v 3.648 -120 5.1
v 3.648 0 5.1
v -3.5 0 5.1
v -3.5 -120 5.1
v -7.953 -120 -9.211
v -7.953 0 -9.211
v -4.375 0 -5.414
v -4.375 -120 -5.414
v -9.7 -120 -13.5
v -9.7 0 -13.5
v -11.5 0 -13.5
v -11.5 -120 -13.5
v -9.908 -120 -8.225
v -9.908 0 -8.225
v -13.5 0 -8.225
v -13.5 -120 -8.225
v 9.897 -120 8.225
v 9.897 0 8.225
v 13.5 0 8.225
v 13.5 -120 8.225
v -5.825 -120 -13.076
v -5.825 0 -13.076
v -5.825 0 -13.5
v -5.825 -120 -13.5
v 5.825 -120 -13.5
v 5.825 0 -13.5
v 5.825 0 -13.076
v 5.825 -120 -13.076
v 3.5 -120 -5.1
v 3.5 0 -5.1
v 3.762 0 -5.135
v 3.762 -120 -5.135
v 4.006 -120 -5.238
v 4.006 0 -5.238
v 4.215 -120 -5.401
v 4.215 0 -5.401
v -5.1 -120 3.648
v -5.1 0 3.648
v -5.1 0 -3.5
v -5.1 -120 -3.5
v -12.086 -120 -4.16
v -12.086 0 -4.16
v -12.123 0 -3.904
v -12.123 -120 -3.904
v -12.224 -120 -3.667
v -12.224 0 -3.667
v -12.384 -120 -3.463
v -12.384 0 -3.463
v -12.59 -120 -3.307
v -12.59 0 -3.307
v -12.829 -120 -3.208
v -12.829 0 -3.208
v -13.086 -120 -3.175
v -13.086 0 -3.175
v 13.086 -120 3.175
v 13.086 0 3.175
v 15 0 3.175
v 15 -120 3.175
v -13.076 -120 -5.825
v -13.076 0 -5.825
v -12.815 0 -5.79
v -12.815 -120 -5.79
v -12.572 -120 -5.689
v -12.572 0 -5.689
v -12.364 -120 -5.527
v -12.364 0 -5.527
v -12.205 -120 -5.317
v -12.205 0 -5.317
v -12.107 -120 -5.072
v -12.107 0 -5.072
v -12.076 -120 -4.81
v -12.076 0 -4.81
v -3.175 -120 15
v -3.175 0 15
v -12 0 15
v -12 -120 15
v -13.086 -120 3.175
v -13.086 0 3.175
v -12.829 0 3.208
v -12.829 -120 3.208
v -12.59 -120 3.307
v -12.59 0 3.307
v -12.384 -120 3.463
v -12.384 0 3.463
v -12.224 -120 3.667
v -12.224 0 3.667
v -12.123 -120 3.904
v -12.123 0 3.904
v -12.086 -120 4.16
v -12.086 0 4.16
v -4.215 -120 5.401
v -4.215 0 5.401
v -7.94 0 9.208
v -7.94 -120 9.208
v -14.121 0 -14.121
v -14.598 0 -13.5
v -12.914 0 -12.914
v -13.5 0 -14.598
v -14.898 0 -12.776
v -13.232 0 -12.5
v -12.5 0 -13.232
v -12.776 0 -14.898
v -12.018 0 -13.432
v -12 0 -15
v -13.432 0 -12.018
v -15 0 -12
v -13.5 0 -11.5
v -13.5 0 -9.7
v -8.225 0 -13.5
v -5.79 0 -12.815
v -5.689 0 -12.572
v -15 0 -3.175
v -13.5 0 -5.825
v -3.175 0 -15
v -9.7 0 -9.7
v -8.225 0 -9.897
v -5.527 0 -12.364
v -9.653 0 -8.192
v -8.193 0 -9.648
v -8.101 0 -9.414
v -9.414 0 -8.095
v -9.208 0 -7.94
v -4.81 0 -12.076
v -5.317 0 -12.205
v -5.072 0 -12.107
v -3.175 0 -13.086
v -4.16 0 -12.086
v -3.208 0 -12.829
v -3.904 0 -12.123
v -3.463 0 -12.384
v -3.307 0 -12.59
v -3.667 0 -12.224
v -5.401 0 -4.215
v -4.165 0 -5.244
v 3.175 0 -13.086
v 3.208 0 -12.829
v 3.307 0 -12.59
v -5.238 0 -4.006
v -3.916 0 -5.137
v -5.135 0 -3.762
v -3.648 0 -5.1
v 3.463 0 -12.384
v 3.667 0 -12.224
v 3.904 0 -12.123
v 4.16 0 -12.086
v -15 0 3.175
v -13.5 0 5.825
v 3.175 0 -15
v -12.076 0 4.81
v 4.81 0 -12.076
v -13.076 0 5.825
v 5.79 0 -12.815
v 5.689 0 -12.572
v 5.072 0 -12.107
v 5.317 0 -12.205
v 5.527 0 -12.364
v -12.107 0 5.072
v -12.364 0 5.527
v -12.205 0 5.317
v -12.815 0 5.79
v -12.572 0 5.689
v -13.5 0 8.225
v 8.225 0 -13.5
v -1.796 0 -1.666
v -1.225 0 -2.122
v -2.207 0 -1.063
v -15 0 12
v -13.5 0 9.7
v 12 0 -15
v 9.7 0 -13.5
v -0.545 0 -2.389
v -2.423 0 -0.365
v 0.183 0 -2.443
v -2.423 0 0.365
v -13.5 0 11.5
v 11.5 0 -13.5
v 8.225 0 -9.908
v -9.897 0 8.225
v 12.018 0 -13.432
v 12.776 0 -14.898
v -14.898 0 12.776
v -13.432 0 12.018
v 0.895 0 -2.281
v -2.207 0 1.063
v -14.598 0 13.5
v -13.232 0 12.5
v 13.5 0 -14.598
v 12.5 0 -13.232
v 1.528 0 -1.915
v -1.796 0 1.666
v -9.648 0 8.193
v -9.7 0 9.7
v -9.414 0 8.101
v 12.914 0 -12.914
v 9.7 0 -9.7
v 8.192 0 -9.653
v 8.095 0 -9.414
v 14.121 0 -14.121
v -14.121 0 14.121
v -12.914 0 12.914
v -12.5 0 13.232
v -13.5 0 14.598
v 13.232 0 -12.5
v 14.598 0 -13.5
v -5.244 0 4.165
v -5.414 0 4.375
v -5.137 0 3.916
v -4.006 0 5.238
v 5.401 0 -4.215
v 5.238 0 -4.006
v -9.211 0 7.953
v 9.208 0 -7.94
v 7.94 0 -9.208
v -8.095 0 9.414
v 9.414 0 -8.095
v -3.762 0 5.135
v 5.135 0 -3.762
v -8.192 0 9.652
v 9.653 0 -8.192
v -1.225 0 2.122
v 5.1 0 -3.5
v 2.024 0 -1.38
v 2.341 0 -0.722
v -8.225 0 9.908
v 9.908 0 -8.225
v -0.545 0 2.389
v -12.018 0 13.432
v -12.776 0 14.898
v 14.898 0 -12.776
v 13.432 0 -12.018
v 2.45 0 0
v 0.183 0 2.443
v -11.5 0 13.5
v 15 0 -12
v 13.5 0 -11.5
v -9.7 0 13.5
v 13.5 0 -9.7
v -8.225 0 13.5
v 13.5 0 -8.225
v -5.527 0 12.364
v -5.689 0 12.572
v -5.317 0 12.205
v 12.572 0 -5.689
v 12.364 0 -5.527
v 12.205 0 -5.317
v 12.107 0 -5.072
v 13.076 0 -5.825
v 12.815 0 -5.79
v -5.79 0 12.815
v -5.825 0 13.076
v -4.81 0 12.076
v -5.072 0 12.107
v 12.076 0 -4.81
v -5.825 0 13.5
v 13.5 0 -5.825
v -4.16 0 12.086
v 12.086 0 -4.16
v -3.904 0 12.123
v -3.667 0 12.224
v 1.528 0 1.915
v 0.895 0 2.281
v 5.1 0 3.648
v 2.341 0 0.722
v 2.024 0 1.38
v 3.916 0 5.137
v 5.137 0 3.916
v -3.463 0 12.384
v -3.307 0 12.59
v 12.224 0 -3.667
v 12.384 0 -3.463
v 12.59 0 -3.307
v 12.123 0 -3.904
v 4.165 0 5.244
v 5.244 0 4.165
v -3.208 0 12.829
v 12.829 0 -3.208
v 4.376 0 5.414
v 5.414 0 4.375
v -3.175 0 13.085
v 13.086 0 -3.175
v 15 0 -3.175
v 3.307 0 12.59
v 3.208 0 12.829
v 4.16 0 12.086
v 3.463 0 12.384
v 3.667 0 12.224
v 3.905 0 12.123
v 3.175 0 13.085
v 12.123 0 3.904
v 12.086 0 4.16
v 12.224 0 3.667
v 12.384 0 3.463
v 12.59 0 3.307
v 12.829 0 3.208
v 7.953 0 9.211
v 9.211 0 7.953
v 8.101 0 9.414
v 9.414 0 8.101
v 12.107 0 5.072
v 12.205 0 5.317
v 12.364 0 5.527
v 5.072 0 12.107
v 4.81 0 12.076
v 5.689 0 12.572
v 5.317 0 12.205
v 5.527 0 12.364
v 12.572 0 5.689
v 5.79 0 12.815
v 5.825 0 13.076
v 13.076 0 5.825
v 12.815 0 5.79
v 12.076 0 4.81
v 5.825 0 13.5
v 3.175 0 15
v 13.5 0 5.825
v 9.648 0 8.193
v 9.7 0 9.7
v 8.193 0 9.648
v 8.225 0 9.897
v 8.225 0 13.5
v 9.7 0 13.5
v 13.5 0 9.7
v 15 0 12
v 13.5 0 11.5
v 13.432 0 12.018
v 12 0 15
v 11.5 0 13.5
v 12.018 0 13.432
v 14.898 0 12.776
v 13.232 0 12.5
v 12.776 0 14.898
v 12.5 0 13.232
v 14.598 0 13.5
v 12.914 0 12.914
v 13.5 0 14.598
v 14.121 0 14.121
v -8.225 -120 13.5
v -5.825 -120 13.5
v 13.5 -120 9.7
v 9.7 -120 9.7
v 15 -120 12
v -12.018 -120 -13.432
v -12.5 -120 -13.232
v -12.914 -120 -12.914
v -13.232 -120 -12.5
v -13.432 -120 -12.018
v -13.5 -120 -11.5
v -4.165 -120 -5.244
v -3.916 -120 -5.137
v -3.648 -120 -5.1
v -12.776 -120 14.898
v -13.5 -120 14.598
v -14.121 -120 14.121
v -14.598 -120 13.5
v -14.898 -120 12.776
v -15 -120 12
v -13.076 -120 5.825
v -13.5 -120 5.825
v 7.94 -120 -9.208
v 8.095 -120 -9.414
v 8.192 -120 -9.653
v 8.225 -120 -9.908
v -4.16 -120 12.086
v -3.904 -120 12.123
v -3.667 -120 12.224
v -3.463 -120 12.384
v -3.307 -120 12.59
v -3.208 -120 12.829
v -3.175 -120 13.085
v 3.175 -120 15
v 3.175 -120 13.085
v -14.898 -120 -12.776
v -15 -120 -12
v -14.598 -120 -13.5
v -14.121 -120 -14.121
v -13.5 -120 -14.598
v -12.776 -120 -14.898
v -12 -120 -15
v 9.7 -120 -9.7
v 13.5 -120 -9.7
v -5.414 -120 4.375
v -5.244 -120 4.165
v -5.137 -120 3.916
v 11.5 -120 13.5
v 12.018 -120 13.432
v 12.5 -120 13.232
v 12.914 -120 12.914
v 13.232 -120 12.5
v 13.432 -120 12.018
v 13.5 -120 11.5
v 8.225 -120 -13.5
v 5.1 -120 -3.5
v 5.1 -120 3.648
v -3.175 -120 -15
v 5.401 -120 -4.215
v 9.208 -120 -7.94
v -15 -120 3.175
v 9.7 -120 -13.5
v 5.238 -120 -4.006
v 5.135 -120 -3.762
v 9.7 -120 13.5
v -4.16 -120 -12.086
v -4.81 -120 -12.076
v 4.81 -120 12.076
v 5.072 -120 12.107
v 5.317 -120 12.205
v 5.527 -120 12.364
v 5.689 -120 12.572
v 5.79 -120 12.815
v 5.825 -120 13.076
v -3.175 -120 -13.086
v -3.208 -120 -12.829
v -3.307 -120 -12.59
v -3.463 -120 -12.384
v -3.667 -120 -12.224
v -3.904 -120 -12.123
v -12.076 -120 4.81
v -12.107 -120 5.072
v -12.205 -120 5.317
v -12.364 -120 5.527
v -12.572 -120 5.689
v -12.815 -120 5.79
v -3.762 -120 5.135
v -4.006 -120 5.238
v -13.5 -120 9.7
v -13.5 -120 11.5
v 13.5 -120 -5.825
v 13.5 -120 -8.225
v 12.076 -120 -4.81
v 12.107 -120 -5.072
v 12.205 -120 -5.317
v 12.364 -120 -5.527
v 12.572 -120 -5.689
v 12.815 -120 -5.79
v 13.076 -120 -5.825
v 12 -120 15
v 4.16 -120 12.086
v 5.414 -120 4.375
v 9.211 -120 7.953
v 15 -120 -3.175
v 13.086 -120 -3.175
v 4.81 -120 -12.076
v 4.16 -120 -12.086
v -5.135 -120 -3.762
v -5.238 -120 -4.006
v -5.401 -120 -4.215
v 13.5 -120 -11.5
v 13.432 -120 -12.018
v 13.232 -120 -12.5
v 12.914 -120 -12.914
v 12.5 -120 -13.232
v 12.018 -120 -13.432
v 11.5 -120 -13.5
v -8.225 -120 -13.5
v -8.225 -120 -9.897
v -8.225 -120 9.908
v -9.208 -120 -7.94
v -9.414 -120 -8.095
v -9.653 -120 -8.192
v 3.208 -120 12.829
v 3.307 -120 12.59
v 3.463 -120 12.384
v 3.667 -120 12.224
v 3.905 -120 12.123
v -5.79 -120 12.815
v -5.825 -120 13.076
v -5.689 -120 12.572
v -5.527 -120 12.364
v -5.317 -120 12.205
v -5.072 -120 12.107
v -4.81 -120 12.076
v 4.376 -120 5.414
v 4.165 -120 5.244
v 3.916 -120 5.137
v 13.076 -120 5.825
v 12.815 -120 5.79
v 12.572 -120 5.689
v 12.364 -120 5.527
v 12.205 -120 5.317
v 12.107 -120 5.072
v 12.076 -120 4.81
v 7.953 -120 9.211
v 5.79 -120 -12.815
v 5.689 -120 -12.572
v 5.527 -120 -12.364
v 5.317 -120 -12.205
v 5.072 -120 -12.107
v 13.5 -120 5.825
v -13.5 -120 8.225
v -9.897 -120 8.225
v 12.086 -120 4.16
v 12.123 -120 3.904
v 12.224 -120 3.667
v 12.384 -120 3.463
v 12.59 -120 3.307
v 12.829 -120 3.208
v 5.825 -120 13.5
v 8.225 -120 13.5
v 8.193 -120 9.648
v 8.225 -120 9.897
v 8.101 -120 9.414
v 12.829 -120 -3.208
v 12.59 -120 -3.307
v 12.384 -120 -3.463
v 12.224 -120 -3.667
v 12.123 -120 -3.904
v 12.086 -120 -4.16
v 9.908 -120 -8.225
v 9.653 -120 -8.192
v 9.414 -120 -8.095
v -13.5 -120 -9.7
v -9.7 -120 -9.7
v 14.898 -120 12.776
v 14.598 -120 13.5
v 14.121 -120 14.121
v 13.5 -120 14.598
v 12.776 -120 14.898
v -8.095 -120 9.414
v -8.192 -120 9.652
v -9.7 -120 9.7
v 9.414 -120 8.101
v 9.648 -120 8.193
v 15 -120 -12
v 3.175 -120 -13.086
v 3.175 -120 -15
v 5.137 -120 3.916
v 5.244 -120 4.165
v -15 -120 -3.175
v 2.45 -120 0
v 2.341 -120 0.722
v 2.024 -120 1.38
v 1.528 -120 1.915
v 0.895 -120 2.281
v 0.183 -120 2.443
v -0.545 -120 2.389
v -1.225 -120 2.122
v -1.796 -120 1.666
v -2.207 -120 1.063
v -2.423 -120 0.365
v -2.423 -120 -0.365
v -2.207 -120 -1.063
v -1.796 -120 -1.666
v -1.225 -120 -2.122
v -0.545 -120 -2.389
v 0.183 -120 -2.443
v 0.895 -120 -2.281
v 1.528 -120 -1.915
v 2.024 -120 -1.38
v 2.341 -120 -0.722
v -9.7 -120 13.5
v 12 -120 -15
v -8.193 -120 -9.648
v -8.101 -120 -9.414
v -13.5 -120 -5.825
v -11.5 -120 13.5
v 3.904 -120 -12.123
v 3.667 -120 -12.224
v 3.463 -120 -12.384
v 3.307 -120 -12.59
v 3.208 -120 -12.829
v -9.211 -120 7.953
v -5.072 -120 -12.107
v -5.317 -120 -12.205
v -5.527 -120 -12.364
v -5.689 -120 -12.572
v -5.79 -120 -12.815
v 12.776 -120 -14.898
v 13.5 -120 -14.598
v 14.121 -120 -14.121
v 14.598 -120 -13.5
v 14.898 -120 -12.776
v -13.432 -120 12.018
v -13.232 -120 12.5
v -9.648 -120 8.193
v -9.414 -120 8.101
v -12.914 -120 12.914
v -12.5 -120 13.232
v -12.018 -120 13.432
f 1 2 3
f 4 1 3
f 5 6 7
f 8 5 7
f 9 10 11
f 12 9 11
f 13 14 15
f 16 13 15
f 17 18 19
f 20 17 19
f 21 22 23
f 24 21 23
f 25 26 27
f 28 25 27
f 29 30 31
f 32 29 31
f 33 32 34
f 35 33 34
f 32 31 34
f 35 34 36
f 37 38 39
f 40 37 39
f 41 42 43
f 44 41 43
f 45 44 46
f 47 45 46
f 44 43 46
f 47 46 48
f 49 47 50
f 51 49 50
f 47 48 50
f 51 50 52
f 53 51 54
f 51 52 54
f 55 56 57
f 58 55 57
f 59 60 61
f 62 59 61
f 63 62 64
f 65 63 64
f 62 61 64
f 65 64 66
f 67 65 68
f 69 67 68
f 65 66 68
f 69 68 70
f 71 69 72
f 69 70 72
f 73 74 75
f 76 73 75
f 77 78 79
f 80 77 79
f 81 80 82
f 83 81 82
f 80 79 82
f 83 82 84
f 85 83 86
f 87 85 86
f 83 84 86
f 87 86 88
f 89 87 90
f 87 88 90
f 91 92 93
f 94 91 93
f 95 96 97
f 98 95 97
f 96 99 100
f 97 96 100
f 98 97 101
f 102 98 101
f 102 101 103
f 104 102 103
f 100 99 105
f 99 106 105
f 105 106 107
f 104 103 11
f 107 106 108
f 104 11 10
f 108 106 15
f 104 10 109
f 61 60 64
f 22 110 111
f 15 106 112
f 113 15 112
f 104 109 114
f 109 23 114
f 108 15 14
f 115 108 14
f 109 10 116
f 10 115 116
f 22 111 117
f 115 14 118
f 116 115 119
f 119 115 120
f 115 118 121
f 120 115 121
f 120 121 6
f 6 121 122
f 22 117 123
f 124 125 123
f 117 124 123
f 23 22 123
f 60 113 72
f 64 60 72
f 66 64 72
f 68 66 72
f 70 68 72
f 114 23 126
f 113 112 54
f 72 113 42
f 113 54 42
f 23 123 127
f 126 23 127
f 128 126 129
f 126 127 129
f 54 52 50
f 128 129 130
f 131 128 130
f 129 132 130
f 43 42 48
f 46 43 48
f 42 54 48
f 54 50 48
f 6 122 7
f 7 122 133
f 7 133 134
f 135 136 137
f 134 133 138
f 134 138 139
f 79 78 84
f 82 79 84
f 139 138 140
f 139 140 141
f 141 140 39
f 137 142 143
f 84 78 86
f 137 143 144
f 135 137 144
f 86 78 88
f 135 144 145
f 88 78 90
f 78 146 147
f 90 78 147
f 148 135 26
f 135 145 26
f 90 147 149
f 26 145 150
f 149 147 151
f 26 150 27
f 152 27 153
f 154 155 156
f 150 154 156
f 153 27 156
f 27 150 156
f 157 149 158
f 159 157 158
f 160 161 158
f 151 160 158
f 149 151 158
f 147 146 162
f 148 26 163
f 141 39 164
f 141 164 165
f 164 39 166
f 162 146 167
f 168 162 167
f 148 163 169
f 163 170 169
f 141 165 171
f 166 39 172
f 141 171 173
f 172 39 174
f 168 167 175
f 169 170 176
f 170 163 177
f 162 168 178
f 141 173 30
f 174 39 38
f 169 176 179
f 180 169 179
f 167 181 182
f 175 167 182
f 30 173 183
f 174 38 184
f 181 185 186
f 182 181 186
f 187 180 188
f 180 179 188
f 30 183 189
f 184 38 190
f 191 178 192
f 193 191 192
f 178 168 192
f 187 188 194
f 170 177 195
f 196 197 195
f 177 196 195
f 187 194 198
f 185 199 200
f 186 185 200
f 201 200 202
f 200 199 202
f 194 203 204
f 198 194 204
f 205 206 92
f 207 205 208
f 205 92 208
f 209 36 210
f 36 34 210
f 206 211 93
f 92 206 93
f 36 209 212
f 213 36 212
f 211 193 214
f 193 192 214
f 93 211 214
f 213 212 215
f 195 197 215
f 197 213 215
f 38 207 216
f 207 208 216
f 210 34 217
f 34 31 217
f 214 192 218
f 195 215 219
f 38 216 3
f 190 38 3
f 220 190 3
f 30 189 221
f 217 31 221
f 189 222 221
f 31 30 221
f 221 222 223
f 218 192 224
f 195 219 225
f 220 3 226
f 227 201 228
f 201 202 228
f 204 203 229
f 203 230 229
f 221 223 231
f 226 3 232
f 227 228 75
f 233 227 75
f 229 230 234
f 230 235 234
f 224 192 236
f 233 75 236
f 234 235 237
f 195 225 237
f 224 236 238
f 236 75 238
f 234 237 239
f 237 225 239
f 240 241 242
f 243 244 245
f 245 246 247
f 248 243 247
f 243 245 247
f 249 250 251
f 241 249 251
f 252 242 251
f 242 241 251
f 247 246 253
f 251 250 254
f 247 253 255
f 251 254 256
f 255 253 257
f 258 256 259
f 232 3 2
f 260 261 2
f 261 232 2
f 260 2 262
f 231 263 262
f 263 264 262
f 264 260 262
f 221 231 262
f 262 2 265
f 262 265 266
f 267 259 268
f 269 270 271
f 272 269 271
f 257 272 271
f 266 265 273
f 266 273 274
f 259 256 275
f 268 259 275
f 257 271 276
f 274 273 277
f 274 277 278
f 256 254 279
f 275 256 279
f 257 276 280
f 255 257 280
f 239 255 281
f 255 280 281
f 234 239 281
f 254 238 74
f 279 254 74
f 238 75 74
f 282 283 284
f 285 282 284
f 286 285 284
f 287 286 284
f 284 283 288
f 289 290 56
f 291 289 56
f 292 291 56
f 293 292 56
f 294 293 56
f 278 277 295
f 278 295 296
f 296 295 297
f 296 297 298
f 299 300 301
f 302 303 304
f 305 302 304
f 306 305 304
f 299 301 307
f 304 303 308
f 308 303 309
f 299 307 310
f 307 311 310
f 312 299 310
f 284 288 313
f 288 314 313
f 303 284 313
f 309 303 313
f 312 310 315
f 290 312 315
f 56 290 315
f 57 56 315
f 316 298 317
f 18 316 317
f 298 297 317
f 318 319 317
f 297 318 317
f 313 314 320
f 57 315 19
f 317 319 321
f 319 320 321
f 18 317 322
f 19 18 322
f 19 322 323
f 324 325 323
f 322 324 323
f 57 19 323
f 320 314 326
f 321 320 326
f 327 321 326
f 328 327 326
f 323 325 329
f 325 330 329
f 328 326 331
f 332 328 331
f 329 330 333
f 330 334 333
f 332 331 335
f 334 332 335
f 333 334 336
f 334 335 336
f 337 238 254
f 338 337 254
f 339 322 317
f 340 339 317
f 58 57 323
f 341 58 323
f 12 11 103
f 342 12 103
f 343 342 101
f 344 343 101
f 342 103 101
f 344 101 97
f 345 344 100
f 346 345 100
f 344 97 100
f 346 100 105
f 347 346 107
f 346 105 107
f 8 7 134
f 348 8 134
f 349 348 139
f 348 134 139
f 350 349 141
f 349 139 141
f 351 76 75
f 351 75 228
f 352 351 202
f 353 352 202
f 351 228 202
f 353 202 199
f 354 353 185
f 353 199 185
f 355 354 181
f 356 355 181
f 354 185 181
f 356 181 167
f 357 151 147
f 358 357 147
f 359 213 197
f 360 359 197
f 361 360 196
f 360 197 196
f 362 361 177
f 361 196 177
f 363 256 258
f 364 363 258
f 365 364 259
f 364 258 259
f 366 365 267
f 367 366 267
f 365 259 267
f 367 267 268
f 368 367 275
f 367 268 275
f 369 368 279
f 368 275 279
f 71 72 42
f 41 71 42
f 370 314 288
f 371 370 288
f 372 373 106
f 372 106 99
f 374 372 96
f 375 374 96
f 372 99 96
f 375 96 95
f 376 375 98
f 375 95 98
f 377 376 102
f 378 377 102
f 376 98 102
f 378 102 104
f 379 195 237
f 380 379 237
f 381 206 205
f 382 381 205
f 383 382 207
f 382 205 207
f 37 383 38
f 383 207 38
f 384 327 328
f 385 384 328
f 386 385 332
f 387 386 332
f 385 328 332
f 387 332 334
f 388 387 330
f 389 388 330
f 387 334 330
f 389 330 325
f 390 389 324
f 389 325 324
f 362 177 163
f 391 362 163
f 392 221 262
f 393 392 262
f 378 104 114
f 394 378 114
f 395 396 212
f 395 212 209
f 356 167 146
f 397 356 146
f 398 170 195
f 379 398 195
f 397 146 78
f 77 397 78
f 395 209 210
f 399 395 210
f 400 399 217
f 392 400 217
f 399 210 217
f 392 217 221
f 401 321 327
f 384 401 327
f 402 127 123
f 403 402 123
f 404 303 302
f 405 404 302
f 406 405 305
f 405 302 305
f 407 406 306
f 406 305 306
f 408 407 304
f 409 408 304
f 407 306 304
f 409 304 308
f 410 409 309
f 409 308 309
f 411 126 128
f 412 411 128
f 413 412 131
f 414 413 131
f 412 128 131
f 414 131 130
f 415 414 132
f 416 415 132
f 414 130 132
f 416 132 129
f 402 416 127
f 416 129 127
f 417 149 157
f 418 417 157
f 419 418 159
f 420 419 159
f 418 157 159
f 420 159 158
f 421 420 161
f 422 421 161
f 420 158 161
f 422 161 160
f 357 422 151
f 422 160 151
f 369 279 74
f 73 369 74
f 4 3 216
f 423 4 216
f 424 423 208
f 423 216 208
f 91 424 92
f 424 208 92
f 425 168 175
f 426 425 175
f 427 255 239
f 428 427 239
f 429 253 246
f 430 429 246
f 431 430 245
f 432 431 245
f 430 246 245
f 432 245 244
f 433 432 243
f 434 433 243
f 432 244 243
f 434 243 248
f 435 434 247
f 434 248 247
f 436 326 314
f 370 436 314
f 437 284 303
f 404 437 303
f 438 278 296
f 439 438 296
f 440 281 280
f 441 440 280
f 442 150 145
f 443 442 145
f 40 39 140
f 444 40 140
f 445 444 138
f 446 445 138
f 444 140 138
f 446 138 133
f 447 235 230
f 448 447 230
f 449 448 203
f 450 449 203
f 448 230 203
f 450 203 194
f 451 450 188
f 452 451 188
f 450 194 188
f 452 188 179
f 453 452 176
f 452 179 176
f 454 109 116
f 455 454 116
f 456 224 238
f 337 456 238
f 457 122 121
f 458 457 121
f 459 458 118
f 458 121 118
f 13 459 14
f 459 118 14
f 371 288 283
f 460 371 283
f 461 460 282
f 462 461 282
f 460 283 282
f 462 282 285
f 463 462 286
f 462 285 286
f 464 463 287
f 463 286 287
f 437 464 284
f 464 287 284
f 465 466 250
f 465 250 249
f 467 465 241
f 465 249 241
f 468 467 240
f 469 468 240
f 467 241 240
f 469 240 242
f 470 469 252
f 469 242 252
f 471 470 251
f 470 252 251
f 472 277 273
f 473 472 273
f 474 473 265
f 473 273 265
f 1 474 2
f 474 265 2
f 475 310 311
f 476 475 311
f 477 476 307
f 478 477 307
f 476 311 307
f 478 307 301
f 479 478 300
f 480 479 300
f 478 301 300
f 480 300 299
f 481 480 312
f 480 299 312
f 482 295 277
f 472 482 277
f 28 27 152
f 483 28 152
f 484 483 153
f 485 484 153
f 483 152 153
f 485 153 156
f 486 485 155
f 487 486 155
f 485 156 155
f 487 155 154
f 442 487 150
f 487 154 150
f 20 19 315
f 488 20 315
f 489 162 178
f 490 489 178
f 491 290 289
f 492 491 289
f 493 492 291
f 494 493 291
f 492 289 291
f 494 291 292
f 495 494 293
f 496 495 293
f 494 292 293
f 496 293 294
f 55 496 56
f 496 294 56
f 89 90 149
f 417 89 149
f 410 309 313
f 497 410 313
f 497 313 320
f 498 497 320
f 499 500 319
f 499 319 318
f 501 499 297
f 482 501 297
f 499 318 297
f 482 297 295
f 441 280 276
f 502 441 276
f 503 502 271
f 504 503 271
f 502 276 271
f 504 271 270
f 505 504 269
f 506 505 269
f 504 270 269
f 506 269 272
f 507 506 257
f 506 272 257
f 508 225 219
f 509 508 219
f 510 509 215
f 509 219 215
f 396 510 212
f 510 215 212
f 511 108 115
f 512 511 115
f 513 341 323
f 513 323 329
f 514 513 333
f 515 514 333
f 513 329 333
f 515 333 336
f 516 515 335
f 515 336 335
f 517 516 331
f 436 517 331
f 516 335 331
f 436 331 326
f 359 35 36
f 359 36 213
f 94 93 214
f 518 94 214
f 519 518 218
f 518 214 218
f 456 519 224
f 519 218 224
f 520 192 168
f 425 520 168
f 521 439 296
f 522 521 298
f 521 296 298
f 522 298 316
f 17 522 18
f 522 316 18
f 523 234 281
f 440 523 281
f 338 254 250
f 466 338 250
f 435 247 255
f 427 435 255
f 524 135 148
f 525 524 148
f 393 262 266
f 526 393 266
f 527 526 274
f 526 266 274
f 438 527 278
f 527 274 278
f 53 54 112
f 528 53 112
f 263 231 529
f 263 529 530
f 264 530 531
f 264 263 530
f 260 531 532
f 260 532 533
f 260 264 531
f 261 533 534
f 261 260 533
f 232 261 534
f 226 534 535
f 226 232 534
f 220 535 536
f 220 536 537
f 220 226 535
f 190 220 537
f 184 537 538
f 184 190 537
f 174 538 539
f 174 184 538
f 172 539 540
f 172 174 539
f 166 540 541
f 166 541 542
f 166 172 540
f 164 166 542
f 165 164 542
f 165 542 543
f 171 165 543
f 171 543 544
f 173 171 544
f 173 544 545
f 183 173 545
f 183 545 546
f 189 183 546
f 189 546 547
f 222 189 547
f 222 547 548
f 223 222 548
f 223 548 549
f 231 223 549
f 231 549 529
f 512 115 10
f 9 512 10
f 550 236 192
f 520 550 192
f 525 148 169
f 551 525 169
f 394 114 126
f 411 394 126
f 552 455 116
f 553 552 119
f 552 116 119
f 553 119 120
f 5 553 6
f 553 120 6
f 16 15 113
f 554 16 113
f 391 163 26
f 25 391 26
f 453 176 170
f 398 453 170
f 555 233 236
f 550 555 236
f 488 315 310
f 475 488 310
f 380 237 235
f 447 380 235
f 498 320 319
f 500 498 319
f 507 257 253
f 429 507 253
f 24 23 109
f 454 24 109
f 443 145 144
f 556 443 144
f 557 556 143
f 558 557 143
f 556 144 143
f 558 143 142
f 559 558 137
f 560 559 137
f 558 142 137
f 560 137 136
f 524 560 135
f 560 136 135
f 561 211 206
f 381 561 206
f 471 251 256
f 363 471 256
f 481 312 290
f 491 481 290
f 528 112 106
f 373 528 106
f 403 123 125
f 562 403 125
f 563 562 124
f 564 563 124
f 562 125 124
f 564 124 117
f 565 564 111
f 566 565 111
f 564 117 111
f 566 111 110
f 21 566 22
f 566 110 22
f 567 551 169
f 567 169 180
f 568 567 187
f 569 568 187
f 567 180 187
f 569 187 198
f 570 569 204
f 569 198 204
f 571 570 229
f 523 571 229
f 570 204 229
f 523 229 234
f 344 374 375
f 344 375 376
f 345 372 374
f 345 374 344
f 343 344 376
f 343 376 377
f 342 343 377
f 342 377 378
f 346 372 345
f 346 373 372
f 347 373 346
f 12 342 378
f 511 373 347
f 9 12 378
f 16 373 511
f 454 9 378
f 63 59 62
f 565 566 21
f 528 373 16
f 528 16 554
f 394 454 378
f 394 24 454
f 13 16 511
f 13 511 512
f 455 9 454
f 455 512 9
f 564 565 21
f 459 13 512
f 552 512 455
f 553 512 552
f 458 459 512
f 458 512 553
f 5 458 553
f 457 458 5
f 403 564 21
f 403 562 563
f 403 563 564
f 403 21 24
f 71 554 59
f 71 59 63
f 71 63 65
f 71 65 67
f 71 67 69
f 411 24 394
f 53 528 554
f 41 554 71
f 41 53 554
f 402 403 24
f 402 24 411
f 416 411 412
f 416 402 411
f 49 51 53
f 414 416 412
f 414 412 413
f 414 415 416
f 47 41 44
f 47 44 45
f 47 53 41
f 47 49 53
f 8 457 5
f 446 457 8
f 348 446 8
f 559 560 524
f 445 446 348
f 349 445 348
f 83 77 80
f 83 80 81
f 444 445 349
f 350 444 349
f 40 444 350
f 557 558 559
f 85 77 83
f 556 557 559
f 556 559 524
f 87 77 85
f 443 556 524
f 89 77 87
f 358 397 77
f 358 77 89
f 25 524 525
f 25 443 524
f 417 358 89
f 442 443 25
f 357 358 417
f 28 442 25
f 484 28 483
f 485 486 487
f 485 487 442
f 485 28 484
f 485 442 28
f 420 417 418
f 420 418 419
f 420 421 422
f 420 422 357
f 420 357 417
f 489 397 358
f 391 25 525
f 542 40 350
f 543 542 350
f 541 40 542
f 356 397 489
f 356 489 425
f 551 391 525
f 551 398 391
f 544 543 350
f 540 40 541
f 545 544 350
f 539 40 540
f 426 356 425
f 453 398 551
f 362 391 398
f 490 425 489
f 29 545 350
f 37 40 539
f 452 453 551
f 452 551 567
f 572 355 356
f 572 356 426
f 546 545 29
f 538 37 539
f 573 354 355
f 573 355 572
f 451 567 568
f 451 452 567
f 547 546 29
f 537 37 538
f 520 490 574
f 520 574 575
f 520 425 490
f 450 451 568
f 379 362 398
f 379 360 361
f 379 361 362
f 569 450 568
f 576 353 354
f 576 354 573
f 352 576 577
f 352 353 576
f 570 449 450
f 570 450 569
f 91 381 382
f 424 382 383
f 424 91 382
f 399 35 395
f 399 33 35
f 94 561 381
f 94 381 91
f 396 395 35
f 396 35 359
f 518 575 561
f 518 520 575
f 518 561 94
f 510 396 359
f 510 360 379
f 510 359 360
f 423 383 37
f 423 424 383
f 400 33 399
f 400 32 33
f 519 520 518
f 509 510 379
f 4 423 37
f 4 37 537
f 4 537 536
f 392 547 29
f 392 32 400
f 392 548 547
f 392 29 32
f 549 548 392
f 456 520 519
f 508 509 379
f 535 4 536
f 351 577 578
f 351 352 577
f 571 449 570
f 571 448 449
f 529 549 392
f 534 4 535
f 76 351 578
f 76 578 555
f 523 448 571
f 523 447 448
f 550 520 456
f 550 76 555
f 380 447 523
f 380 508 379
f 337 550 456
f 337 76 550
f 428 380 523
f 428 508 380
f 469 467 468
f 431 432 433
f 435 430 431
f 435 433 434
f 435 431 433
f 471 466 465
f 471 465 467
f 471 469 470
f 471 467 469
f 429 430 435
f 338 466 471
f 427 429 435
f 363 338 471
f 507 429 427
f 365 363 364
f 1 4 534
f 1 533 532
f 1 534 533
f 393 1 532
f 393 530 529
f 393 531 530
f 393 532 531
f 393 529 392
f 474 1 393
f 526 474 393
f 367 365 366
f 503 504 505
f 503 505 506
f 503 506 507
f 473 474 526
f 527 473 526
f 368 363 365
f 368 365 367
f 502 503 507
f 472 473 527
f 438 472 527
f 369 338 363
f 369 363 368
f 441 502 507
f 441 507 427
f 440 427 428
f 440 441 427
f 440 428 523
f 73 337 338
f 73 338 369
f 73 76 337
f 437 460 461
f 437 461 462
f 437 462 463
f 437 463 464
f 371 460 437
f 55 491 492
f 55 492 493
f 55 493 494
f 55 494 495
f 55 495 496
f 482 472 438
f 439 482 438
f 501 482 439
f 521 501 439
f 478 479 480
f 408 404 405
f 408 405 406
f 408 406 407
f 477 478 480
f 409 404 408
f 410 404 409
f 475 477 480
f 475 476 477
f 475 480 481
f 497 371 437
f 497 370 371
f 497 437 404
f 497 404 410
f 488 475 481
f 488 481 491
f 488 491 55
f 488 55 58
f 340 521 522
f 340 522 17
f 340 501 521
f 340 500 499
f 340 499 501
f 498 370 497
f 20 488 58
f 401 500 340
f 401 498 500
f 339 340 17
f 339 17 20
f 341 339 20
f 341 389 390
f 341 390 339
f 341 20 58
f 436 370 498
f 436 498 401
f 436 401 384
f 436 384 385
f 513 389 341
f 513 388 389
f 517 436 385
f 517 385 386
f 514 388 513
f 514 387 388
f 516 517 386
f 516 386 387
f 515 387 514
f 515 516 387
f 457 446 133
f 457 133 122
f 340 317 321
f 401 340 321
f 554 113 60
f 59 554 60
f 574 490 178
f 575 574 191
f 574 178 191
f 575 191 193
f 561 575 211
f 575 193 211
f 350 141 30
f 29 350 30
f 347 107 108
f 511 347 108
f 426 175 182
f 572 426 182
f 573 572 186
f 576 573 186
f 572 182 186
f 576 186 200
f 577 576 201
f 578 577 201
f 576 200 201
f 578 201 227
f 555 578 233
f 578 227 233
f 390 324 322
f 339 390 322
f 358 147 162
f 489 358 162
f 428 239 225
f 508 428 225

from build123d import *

# Parameters (mm, degrees)
F0_R     = 2.45
F1_DEPTH = 460
F2_DEPTH = 340


# Not quite as in the source:
# - ends of sketch curves that miss each other by under 0.0002 mm in the source are joined


with BuildPart() as f1:
    # F0 (on Front) → F1 (new body)
    with BuildSketch(Plane.XZ):
        with BuildLine():
            Line((-3.1749674082, 15), (-12, 15))
            ThreePointArc((-12, 15), (-14.1213203436, 14.1213203436), (-15, 12))
            Line((-15, 12), (-15, 3.175))
            Line((-15, 3.175), (-13.0855346263, 3.175))
            ThreePointArc((-13.0855346263, 3.175), (-12.3835980145, 3.4627605788), (-12.0856407741, 4.1604300138))
            Line((-12.0856407741, 4.1604300138), (-12.0761692778, 4.8104300138))
            ThreePointArc((-12.0761692778, 4.8104300138), (-12.3638237087, 5.5269366118), (-13.0760631299, 5.825))
            Line((-13.0760631299, 5.825), (-13.5, 5.825))
            Line((-13.5, 5.825), (-13.5, 8.225))
            Line((-13.5, 8.225), (-9.8968845016, 8.225))
            ThreePointArc((-9.8968845016, 8.225), (-9.5279915195, 8.1544718757), (-9.2111331975, 7.9528359354))
            Line((-9.2111331975, 7.9528359354), (-5.4142486959, 4.3754933338))
            ThreePointArc((-5.4142486959, 4.3754933338), (-5.1819174045, 4.0440465354), (-5.1, 3.6476573984))
            Line((-5.1, 3.6476573984), (-5.1, -3.4999243287))
            ThreePointArc((-5.1, -3.4999243287), (-5.1782354607, -3.8876744211), (-5.4007002683, -4.2147528992))
            Line((-5.4007002683, -4.2147528992), (-9.2084959767, -7.9398285705))
            ThreePointArc((-9.2084959767, -7.9398285705), (-9.5301904718, -8.1509666761), (-9.9077957084, -8.225))
            Line((-9.9077957084, -8.225), (-13.5, -8.225))
            Line((-13.5, -8.225), (-13.5, -5.825))
            Line((-13.5, -5.825), (-13.0760631299, -5.825))
            ThreePointArc((-13.0760631299, -5.825), (-12.3638237087, -5.5269366118), (-12.0761692778, -4.8104300138))
            Line((-12.0761692778, -4.8104300138), (-12.0856407741, -4.1604300138))
            ThreePointArc((-12.0856407741, -4.1604300138), (-12.3835980145, -3.4627605788), (-13.0855346263, -3.175))
            Line((-13.0855346263, -3.175), (-15, -3.175))
            Line((-15, -3.175), (-15, -12))
            ThreePointArc((-15, -12), (-14.1213203436, -14.1213203436), (-12, -15))
            Line((-12, -15), (-3.175, -15))
            Line((-3.175, -15), (-3.175, -13.0855346263))
            ThreePointArc((-3.175, -13.0855346263), (-3.4627605788, -12.3835980145), (-4.1604300138, -12.0856407741))
            Line((-4.1604300138, -12.0856407741), (-4.8104300138, -12.0761692778))
            ThreePointArc((-4.8104300138, -12.0761692778), (-5.5269366118, -12.3638237087), (-5.825, -13.0760631299))
            Line((-5.825, -13.0760631299), (-5.825, -13.5))
            Line((-5.825, -13.5), (-8.225, -13.5))
            Line((-8.225, -13.5), (-8.225, -9.8968845016))
            ThreePointArc((-8.225, -9.8968845016), (-8.1544718757, -9.5279915195), (-7.9528359354, -9.2111331975))
            Line((-7.9528359354, -9.2111331975), (-4.3754933338, -5.4142486959))
            ThreePointArc((-4.3754933338, -5.4142486959), (-4.0440465354, -5.1819174045), (-3.6476573984, -5.1))
            Line((-3.6476573984, -5.1), (3.4999243287, -5.1))
            ThreePointArc((3.4999243287, -5.1), (3.8876744211, -5.1782354607), (4.2147528992, -5.4007002683))
            Line((4.2147528992, -5.4007002683), (7.9398285705, -9.2084959767))
            ThreePointArc((7.9398285705, -9.2084959767), (8.1509666761, -9.5301904718), (8.225, -9.9077957084))
            Line((8.225, -9.9077957084), (8.225, -13.5))
            Line((8.225, -13.5), (5.825, -13.5))
            Line((5.825, -13.5), (5.825, -13.0760631299))
            ThreePointArc((5.825, -13.0760631299), (5.5269366118, -12.3638237087), (4.8104300138, -12.0761692778))
            Line((4.8104300138, -12.0761692778), (4.1604300138, -12.0856407741))
            ThreePointArc((4.1604300138, -12.0856407741), (3.4627605788, -12.3835980145), (3.175, -13.0855346263))
            Line((3.175, -13.0855346263), (3.175, -15))
            Line((3.175, -15), (12, -15))
            ThreePointArc((12, -15), (14.1213203436, -14.1213203436), (15, -12))
            Line((15, -12), (15, -3.175))
            Line((15, -3.175), (13.0855346263, -3.175))
            ThreePointArc((13.0855346263, -3.175), (12.3835980145, -3.4627605788), (12.0856407741, -4.1604300138))
            Line((12.0856407741, -4.1604300138), (12.0761692778, -4.8104300138))
            ThreePointArc((12.0761692778, -4.8104300138), (12.3638237087, -5.5269366118), (13.0760631299, -5.825))
            Line((13.0760631299, -5.825), (13.5, -5.825))
            Line((13.5, -5.825), (13.5, -8.225))
            Line((13.5, -8.225), (9.9077957084, -8.225))
            ThreePointArc((9.9077957084, -8.225), (9.5301904718, -8.1509666761), (9.2084959767, -7.9398285705))
            Line((9.2084959767, -7.9398285705), (5.4007002683, -4.2147528992))
            ThreePointArc((5.4007002683, -4.2147528992), (5.1782354607, -3.8876744211), (5.1, -3.4999243287))
            Line((5.1, -3.4999243287), (5.1, 3.6476573984))
            ThreePointArc((5.1, 3.6476573984), (5.1819174045, 4.0440465354), (5.4142486959, 4.3754933338))
            Line((5.4142486959, 4.3754933338), (9.2111331975, 7.9528359354))
            ThreePointArc((9.2111331975, 7.9528359354), (9.5279915195, 8.1544718757), (9.8968845016, 8.225))
            Line((9.8968845016, 8.225), (13.5, 8.225))
            Line((13.5, 8.225), (13.5, 5.825))
            Line((13.5, 5.825), (13.0760631299, 5.825))
            ThreePointArc((13.0760631299, 5.825), (12.3638237087, 5.5269366118), (12.0761692778, 4.8104300138))
            Line((12.0761692778, 4.8104300138), (12.0856407741, 4.1604300138))
            ThreePointArc((12.0856407741, 4.1604300138), (12.3835980145, 3.4627605788), (13.0855346263, 3.175))
            Line((13.0855346263, 3.175), (15, 3.175))
            Line((15, 3.175), (15, 12))
            ThreePointArc((15, 12), (14.1213203436, 14.1213203436), (12, 15))
            Line((12, 15), (3.1750325918, 15))
            Line((3.1750325918, 15), (3.1750325918, 13.0854824722))
            ThreePointArc((3.1750325918, 13.0854824722), (3.4627931706, 12.3835458604), (4.1604626057, 12.0855886201))
            Line((4.1604626057, 12.0855886201), (4.8104626057, 12.0761171237))
            ThreePointArc((4.8104626057, 12.0761171237), (5.5269692036, 12.3637715546), (5.8250325918, 13.0760109758))
            Line((5.8250325918, 13.0760109758), (5.8250325918, 13.4999478459))
            Line((5.8250325918, 13.4999478459), (8.2250325918, 13.4999478459))
            Line((8.2250325918, 13.4999478459), (8.2250325918, 9.8968323476))
            ThreePointArc((8.2250325918, 9.8968323476), (8.1545044675, 9.5279393654), (7.9528685272, 9.2110810434))
            Line((7.9528685272, 9.2110810434), (4.3755259256, 5.4141965418))
            ThreePointArc((4.3755259256, 5.4141965418), (4.0440791272, 5.1818652505), (3.6476899902, 5.0999478459))
            Line((3.6476899902, 5.0999478459), (-3.4998917369, 5.0999478459))
            ThreePointArc((-3.4998917369, 5.0999478459), (-3.8876418293, 5.1781833067), (-4.2147203074, 5.4006481142))
            Line((-4.2147203074, 5.4006481142), (-7.9397959787, 9.2084438226))
            ThreePointArc((-7.9397959787, 9.2084438226), (-8.1509340843, 9.5301383177), (-8.2249674082, 9.9077435543))
            Line((-8.2249674082, 9.9077435543), (-8.2249674082, 13.4999478459))
            Line((-8.2249674082, 13.4999478459), (-5.8249674082, 13.4999478459))
            Line((-5.8249674082, 13.4999478459), (-5.8249674082, 13.0760109758))
            ThreePointArc((-5.8249674082, 13.0760109758), (-5.5269040199, 12.3637715546), (-4.810397422, 12.0761171237))
            Line((-4.810397422, 12.0761171237), (-4.160397422, 12.0855886201))
            ThreePointArc((-4.160397422, 12.0855886201), (-3.462727987, 12.3835458604), (-3.1749674082, 13.0854824722))
            Line((-3.1749674082, 13.0854824722), (-3.1749674082, 15))
        make_face()
        with BuildLine():
            Line((-13.5, -11.5), (-13.5, -9.7))
            Line((-13.5, -9.7), (-9.7, -9.7))
            Line((-9.7, -9.7), (-9.7, -13.5))
            Line((-9.7, -13.5), (-11.5, -13.5))
            ThreePointArc((-11.5, -13.5), (-12.9142135624, -12.9142135624), (-13.5, -11.5))
        make_face(mode=Mode.SUBTRACT)
        with BuildLine():
            Line((9.7, -9.7), (13.5, -9.7))
            Line((13.5, -9.7), (13.5, -11.5))
            ThreePointArc((13.5, -11.5), (12.9142135624, -12.9142135624), (11.5, -13.5))
            Line((11.5, -13.5), (9.7, -13.5))
            Line((9.7, -13.5), (9.7, -9.7))
        make_face(mode=Mode.SUBTRACT)
        with BuildLine():
            ThreePointArc((-13.5, 11.5), (-12.9142135624, 12.9142135624), (-11.5, 13.5))
            Line((-11.5, 13.5), (-9.7, 13.5))
            Line((-9.7, 13.5), (-9.7, 9.7))
            Line((-9.7, 9.7), (-13.5, 9.7))
            Line((-13.5, 9.7), (-13.5, 11.5))
        make_face(mode=Mode.SUBTRACT)
        Circle(F0_R, mode=Mode.SUBTRACT)
        with BuildLine():
            Line((9.7, 13.5), (11.5, 13.5))
            ThreePointArc((11.5, 13.5), (12.9142135624, 12.9142135624), (13.5, 11.5))
            Line((13.5, 11.5), (13.5, 9.7))
            Line((13.5, 9.7), (9.7, 9.7))
            Line((9.7, 9.7), (9.7, 13.5))
        make_face(mode=Mode.SUBTRACT)
    extrude(amount=F1_DEPTH)

    # F2 (cut): a face of the model
    f2_faces = [f1.faces().sort_by_distance(p)[0] for p in [
        (5.2291627207, -460, 12.6659491494),
    ]]
    extrude(f2_faces, amount=-F2_DEPTH, mode=Mode.SUBTRACT)


solid = f1.part
